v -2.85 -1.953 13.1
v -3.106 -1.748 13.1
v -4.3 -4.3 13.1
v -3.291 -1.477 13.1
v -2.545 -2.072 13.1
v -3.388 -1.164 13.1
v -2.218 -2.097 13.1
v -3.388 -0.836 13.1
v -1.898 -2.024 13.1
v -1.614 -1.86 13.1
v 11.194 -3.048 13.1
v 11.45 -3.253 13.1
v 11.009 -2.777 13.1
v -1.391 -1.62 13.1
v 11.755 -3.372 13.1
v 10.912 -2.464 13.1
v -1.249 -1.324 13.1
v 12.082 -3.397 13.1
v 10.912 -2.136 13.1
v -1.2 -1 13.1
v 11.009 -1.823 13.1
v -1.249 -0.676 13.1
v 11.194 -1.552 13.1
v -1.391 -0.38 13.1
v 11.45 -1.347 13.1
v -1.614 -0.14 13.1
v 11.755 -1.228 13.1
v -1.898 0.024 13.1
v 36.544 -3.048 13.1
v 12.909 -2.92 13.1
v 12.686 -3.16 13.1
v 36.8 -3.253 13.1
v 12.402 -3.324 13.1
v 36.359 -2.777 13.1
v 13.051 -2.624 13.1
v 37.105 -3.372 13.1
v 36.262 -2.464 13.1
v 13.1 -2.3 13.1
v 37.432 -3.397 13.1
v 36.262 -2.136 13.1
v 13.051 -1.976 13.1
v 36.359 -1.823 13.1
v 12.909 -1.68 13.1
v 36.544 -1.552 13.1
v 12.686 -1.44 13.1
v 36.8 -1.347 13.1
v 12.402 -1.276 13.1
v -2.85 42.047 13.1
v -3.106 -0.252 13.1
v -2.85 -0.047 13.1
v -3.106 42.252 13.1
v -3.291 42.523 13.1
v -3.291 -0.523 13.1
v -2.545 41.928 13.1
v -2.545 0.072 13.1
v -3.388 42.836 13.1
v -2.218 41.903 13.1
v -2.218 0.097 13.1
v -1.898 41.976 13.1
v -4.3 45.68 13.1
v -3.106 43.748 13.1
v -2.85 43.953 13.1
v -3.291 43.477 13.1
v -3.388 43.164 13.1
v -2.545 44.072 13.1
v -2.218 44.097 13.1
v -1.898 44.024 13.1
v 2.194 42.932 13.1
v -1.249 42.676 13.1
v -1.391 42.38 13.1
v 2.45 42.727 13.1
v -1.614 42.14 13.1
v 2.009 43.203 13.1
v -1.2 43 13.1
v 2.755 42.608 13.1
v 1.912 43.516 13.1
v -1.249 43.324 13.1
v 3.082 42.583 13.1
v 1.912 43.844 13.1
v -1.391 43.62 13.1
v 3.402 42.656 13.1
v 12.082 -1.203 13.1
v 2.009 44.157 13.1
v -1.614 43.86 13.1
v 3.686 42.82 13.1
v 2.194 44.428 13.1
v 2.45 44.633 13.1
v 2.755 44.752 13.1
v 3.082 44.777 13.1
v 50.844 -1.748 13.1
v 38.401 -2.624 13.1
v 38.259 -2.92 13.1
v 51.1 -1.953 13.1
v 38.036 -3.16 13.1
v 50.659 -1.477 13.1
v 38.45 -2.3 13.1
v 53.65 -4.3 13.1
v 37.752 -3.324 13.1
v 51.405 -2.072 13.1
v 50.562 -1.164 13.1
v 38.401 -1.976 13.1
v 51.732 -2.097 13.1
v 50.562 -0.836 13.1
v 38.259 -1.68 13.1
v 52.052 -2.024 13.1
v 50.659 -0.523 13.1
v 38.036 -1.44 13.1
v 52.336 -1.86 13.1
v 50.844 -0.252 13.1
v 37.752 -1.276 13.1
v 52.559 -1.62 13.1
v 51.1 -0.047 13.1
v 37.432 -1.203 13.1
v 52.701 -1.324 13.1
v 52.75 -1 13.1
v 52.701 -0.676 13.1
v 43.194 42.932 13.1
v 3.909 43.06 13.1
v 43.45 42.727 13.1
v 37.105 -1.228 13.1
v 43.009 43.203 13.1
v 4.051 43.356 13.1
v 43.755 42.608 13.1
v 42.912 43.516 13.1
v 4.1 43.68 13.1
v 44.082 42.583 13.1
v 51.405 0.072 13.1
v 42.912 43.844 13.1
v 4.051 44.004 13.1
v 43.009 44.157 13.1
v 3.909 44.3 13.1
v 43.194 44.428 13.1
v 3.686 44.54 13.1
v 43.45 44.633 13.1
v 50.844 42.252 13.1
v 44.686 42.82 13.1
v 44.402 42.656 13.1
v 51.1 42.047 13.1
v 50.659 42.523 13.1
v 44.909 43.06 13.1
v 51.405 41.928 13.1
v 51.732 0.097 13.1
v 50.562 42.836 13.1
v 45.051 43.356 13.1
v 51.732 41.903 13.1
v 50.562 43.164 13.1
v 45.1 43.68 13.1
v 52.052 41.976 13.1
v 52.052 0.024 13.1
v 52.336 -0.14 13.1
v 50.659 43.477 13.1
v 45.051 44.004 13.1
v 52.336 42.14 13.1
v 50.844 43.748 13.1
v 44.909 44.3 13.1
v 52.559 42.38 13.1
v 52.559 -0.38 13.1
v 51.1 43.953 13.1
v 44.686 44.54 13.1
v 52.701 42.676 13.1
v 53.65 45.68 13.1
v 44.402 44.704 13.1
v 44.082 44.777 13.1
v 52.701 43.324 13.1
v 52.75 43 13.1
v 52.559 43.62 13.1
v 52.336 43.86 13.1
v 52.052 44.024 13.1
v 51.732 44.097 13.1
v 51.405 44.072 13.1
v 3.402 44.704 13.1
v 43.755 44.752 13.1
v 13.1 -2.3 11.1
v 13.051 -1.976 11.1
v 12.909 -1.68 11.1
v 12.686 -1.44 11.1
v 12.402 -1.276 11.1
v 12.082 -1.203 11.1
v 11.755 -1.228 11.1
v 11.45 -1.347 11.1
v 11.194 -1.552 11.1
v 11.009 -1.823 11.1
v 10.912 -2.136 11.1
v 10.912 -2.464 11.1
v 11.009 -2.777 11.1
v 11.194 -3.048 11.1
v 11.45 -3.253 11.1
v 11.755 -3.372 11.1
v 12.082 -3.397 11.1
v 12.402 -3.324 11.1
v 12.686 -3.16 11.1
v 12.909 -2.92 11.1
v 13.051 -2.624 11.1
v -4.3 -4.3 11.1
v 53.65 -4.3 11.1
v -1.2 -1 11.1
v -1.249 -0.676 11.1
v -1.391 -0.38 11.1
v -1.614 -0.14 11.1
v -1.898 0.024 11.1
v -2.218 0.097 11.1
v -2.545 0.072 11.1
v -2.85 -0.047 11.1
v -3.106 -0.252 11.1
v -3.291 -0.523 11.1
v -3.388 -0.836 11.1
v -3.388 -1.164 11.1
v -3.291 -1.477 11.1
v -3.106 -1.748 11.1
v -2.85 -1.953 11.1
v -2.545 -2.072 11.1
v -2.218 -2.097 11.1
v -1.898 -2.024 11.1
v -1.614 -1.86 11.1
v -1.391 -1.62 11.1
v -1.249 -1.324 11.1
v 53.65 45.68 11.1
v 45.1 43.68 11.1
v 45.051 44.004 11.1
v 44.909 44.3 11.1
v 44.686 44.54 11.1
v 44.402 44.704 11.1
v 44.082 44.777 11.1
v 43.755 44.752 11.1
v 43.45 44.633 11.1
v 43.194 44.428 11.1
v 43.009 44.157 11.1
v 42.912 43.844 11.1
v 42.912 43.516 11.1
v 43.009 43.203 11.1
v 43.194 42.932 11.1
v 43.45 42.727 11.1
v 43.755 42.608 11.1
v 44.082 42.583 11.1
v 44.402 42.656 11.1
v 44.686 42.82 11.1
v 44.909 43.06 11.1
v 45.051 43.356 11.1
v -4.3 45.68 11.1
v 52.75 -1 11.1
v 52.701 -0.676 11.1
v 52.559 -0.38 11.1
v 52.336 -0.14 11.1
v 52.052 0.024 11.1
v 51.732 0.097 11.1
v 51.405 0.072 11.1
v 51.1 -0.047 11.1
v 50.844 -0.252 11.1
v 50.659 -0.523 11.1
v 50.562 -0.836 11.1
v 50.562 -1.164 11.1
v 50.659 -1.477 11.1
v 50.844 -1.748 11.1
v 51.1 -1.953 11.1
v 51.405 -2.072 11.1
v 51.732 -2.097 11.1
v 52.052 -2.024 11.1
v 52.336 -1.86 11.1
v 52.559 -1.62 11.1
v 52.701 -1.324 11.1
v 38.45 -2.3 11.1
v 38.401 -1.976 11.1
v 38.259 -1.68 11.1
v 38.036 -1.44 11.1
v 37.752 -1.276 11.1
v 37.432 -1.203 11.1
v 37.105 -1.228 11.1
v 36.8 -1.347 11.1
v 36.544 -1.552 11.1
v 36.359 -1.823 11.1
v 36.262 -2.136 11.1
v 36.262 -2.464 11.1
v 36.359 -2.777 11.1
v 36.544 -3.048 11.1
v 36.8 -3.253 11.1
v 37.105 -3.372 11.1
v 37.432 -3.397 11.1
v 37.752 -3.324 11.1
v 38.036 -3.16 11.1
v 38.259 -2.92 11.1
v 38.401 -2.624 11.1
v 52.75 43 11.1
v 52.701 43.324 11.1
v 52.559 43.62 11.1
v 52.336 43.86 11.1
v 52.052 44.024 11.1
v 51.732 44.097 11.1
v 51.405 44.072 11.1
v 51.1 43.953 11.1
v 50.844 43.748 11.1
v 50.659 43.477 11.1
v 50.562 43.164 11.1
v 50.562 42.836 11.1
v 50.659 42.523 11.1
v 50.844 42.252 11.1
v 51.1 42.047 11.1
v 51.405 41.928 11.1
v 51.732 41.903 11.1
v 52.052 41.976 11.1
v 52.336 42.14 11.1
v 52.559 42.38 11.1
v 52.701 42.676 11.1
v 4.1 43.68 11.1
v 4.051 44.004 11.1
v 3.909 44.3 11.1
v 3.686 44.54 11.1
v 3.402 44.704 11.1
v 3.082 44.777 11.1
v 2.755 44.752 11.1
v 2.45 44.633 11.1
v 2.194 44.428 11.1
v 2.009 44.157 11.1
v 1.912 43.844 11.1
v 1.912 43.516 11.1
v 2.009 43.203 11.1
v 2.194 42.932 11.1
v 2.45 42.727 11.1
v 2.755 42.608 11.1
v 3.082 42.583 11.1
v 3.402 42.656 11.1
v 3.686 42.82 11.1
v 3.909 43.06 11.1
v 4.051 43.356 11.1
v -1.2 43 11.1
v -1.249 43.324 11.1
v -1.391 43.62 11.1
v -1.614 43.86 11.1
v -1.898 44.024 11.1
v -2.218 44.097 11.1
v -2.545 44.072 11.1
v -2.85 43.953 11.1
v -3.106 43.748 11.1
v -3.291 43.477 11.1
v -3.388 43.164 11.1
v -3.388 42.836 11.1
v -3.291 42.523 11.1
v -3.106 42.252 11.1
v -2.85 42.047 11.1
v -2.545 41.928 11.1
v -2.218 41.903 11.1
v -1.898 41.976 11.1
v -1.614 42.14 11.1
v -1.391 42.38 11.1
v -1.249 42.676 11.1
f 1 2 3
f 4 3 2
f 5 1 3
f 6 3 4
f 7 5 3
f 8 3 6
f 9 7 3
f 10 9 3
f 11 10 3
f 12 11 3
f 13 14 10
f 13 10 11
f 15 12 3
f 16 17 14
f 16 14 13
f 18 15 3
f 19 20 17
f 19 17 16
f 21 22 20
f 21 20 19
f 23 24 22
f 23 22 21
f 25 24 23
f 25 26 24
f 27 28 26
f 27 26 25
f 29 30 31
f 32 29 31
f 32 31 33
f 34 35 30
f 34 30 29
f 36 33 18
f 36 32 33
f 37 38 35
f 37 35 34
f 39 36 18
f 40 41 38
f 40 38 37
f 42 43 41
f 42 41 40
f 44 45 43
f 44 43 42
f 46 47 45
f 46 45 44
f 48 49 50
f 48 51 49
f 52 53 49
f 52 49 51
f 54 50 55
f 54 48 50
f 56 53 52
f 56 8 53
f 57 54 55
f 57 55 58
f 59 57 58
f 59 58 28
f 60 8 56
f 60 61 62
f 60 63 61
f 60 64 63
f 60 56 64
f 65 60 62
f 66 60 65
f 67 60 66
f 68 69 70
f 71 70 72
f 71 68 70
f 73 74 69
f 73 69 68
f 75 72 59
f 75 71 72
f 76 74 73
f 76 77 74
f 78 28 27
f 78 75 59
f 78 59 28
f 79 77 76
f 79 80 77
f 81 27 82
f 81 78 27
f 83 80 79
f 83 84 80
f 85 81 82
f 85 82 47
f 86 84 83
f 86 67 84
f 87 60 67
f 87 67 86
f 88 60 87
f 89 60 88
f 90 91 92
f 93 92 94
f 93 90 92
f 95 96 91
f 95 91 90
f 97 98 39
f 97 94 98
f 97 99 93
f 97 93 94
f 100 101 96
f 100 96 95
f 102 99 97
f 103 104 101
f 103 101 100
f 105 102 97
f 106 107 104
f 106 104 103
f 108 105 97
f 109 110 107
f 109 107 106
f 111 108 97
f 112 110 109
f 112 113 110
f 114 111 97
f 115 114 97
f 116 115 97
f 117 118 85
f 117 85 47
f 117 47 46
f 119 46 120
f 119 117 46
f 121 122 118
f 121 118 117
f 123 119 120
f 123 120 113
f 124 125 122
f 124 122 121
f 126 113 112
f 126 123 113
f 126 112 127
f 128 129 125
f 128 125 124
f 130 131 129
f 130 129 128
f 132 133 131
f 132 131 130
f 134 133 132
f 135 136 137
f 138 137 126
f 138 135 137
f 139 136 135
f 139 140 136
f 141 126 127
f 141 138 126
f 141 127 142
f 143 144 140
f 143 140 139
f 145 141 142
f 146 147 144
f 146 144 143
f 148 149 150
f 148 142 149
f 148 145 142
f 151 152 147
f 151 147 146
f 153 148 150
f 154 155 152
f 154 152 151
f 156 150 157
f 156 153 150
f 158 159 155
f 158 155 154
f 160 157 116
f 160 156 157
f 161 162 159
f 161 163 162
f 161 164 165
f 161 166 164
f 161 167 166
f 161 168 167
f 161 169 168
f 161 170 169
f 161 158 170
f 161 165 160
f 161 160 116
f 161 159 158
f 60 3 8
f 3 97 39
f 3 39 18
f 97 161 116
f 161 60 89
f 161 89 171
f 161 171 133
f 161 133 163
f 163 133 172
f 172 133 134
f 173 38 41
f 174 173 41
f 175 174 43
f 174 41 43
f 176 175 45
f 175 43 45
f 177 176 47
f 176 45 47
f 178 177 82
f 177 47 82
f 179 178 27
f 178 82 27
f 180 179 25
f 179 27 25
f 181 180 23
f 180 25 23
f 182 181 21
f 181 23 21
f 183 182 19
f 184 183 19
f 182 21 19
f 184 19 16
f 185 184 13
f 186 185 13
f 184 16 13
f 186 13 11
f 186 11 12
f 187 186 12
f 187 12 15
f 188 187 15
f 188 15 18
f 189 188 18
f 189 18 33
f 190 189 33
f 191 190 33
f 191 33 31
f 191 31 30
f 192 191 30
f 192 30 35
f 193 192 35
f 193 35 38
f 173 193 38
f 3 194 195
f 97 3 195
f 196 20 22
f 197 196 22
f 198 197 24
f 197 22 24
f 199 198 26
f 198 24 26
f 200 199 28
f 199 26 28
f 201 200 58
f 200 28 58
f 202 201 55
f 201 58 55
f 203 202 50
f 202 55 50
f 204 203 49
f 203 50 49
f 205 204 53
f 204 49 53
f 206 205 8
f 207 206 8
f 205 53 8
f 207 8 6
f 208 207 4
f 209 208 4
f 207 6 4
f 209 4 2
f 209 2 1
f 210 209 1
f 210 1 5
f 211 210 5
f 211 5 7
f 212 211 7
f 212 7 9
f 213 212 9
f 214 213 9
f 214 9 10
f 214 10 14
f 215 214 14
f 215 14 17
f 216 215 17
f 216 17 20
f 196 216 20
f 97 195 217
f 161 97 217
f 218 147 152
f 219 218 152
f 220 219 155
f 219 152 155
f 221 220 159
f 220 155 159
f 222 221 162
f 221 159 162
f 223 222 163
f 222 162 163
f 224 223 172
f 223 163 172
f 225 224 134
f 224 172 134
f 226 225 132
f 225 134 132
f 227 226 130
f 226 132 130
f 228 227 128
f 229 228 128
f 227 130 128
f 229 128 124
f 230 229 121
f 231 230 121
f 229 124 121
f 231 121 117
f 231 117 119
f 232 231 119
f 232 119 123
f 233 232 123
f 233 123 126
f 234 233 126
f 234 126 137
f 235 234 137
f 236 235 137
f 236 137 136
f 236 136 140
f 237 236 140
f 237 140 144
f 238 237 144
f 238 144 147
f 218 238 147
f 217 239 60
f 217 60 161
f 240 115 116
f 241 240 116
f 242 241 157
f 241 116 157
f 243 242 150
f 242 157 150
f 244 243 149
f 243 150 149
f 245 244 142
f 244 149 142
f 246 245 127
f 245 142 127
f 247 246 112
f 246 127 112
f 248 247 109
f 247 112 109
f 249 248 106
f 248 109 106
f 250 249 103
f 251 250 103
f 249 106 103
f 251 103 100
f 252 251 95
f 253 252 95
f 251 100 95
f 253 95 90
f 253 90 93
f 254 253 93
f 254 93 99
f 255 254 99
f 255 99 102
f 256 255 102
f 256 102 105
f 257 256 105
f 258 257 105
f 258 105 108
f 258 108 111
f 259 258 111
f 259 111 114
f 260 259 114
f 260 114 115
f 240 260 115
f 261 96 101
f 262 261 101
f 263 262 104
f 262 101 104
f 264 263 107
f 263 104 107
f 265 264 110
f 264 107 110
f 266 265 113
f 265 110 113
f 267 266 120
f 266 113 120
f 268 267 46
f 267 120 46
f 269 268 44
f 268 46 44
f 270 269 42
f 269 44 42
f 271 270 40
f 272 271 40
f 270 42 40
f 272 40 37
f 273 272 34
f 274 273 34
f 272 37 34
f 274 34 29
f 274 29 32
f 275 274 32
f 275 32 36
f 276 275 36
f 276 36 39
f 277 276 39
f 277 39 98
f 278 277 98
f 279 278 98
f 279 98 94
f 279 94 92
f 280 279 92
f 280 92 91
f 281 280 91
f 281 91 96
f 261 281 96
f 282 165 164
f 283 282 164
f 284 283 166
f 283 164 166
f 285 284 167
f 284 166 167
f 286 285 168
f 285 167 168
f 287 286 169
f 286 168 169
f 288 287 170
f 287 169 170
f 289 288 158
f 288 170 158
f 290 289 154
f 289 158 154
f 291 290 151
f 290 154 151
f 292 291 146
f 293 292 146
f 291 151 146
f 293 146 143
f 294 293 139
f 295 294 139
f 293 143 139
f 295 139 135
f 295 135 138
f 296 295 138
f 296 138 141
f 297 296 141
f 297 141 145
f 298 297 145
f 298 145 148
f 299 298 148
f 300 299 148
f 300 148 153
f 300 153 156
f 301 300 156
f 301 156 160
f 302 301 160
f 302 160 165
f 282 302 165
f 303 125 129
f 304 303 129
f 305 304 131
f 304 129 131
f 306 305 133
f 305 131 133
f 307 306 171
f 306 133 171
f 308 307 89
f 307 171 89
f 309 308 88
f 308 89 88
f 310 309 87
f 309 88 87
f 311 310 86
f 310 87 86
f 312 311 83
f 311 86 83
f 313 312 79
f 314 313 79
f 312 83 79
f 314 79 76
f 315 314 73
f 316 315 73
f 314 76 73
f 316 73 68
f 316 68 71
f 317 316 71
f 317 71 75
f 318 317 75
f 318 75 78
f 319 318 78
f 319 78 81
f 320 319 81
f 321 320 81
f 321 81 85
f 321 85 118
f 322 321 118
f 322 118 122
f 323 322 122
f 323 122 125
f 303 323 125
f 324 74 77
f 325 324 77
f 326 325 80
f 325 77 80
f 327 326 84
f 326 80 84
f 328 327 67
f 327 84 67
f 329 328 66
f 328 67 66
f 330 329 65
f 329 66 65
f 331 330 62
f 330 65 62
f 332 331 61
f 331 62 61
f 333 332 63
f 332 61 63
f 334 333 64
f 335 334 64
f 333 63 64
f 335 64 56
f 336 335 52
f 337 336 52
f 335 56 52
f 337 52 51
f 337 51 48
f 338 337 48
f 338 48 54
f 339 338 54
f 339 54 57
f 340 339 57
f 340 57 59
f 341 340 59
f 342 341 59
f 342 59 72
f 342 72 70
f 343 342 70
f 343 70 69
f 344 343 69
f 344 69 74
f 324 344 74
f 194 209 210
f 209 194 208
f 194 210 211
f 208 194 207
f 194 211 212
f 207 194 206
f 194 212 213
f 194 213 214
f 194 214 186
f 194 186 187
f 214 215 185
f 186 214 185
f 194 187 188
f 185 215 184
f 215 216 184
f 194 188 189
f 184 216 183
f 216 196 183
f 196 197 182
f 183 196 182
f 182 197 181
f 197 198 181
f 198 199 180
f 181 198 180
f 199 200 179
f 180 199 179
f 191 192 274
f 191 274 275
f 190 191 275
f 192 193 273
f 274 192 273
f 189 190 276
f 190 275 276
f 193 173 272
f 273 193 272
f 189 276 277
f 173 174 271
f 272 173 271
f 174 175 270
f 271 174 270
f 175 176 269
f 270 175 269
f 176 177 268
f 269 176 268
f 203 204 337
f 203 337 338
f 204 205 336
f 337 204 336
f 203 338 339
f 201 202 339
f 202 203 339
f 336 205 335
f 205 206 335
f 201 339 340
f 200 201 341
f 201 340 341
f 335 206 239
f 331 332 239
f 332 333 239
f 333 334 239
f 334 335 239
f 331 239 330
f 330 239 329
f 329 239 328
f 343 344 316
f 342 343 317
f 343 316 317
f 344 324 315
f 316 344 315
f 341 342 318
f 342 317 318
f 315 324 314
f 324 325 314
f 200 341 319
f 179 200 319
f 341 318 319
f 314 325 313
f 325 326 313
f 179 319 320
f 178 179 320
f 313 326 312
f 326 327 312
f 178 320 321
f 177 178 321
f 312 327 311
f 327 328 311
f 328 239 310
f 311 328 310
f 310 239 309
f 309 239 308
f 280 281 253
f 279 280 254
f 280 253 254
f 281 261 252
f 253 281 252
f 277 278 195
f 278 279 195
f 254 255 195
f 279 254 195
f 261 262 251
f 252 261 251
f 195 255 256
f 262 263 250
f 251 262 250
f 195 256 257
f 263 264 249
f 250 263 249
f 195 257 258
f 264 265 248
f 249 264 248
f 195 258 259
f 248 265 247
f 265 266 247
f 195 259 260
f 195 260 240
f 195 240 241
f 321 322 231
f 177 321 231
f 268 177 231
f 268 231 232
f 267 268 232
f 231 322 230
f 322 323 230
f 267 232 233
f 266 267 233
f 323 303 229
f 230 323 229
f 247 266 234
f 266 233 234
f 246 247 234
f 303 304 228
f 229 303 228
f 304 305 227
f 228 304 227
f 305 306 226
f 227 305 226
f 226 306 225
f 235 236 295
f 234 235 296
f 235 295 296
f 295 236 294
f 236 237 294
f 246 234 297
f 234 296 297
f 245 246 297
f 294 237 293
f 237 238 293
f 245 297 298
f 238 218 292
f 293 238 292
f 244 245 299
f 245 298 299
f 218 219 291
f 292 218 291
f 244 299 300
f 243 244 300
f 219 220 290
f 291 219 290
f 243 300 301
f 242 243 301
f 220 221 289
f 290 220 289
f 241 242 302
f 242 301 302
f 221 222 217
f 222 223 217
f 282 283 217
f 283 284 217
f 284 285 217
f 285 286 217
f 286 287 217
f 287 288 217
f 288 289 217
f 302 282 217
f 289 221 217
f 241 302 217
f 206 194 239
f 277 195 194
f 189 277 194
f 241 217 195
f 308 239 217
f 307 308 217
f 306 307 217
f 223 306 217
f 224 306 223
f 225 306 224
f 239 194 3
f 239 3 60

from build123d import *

# Parameters (mm, degrees)
SKETCH_1_W                 = 57.95
SKETCH_1_H                 = 49.98
COVER_2MM_DEPTH            = 2
SKETCH_2_R                 = 1.1
COVER_8XD2P2_THROUGH_DEPTH = 71.491027089


with BuildPart() as part:
    # 草图1 → Cover_2mm (new body)
    with BuildSketch(Plane.XY):
        with Locations((24.675, 20.69)):
            Rectangle(SKETCH_1_W, SKETCH_1_H)
    extrude(amount=COVER_2MM_DEPTH)


with BuildPart() as part_1:
    # Stock_Z_Position: moved
    add(part.part.moved(Location((0, 0, 11.1))))

    # 草图2 → Cover_8xD2p2_Through (cut, through all)
    with BuildSketch(Plane.XY.offset(13.1)):
        with Locations((-2.3, -1)):
            Circle(SKETCH_2_R)
        with Locations((-2.3, 43)):
            Circle(SKETCH_2_R)
        with Locations((51.65, -1)):
            Circle(SKETCH_2_R)
        with Locations((51.65, 43)):
            Circle(SKETCH_2_R)
        with Locations((12, -2.3)):
            Circle(SKETCH_2_R)
        with Locations((37.35, -2.3)):
            Circle(SKETCH_2_R)
        with Locations((3, 43.68)):
            Circle(SKETCH_2_R)
        with Locations((44, 43.68)):
            Circle(SKETCH_2_R)
    extrude(amount=-COVER_8XD2P2_THROUGH_DEPTH, mode=Mode.SUBTRACT)


solid = part_1.part
